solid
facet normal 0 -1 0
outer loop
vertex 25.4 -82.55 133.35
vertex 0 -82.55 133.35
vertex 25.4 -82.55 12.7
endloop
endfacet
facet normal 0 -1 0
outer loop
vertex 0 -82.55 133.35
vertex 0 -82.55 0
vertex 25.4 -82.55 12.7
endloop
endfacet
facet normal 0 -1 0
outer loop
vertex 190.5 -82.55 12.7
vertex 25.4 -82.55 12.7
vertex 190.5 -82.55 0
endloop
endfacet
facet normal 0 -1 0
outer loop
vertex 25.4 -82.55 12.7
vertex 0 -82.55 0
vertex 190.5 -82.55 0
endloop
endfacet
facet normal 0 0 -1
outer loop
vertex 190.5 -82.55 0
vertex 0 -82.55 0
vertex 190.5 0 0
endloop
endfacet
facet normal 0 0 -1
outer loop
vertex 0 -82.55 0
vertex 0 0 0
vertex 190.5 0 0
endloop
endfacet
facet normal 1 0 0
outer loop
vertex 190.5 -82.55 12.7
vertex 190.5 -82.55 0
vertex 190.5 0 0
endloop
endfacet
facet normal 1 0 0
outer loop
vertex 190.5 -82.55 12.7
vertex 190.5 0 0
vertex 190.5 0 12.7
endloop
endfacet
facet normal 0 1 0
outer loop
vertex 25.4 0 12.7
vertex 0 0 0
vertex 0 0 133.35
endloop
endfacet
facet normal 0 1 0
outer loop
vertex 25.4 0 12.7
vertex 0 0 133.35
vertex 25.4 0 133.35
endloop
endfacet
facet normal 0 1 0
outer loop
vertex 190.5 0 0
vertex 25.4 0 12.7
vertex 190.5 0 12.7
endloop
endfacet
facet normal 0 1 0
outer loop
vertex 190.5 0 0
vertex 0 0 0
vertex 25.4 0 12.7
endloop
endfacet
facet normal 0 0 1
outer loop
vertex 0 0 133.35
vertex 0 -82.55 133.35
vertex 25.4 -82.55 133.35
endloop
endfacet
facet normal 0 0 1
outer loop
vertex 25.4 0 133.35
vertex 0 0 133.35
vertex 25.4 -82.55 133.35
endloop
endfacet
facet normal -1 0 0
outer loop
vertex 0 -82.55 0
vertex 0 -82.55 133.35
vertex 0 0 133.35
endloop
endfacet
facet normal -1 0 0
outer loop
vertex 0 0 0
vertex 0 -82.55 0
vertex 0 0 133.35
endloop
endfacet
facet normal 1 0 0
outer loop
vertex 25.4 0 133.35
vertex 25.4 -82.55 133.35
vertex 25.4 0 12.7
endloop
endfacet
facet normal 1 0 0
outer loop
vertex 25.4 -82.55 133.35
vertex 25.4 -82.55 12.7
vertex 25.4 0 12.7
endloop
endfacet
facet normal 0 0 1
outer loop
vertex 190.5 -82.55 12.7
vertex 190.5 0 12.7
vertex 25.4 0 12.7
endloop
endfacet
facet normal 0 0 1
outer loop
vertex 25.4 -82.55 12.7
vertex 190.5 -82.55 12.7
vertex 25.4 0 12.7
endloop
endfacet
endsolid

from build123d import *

# Parameters (mm, degrees)
F1_DEPTH  = 25.4
F2_DEPTH  = 57.15
F2_FACE_W = 25.4
F2_FACE_H = 82.55
F3_DEPTH  = 76.2


with BuildPart() as f1:
    # F0 (on Front) → F1 (new body)
    with BuildSketch(Plane.XZ):
        Polygon((0, 57.15), (0, 0), (190.5, 0), (190.5, 12.7), (25.4, 12.7), (25.4, 57.15), align=None)
    extrude(amount=F1_DEPTH)

    # F1_face (on face) → F2 (join)
    with BuildSketch(Plane(origin=(68.984091, -25.4, 15.442045), x_dir=(1, 0, 0), z_dir=(0, -1, 0))):
        Polygon((-43.584091, -2.742045), (-43.584091, 41.707955), (-68.984091, 41.707955), (-68.984091, -15.442045), (121.515909, -15.442045), (121.515909, -2.742045), align=None)
    extrude(amount=F2_DEPTH)

    # F2_face (on face) → F3 (join)
    with BuildSketch(Plane(origin=(12.7, -41.275, 57.15), x_dir=(1, 0, 0), z_dir=(0, 0, 1))):
        Rectangle(F2_FACE_W, F2_FACE_H)
    extrude(amount=F3_DEPTH)


solid = f1.part
